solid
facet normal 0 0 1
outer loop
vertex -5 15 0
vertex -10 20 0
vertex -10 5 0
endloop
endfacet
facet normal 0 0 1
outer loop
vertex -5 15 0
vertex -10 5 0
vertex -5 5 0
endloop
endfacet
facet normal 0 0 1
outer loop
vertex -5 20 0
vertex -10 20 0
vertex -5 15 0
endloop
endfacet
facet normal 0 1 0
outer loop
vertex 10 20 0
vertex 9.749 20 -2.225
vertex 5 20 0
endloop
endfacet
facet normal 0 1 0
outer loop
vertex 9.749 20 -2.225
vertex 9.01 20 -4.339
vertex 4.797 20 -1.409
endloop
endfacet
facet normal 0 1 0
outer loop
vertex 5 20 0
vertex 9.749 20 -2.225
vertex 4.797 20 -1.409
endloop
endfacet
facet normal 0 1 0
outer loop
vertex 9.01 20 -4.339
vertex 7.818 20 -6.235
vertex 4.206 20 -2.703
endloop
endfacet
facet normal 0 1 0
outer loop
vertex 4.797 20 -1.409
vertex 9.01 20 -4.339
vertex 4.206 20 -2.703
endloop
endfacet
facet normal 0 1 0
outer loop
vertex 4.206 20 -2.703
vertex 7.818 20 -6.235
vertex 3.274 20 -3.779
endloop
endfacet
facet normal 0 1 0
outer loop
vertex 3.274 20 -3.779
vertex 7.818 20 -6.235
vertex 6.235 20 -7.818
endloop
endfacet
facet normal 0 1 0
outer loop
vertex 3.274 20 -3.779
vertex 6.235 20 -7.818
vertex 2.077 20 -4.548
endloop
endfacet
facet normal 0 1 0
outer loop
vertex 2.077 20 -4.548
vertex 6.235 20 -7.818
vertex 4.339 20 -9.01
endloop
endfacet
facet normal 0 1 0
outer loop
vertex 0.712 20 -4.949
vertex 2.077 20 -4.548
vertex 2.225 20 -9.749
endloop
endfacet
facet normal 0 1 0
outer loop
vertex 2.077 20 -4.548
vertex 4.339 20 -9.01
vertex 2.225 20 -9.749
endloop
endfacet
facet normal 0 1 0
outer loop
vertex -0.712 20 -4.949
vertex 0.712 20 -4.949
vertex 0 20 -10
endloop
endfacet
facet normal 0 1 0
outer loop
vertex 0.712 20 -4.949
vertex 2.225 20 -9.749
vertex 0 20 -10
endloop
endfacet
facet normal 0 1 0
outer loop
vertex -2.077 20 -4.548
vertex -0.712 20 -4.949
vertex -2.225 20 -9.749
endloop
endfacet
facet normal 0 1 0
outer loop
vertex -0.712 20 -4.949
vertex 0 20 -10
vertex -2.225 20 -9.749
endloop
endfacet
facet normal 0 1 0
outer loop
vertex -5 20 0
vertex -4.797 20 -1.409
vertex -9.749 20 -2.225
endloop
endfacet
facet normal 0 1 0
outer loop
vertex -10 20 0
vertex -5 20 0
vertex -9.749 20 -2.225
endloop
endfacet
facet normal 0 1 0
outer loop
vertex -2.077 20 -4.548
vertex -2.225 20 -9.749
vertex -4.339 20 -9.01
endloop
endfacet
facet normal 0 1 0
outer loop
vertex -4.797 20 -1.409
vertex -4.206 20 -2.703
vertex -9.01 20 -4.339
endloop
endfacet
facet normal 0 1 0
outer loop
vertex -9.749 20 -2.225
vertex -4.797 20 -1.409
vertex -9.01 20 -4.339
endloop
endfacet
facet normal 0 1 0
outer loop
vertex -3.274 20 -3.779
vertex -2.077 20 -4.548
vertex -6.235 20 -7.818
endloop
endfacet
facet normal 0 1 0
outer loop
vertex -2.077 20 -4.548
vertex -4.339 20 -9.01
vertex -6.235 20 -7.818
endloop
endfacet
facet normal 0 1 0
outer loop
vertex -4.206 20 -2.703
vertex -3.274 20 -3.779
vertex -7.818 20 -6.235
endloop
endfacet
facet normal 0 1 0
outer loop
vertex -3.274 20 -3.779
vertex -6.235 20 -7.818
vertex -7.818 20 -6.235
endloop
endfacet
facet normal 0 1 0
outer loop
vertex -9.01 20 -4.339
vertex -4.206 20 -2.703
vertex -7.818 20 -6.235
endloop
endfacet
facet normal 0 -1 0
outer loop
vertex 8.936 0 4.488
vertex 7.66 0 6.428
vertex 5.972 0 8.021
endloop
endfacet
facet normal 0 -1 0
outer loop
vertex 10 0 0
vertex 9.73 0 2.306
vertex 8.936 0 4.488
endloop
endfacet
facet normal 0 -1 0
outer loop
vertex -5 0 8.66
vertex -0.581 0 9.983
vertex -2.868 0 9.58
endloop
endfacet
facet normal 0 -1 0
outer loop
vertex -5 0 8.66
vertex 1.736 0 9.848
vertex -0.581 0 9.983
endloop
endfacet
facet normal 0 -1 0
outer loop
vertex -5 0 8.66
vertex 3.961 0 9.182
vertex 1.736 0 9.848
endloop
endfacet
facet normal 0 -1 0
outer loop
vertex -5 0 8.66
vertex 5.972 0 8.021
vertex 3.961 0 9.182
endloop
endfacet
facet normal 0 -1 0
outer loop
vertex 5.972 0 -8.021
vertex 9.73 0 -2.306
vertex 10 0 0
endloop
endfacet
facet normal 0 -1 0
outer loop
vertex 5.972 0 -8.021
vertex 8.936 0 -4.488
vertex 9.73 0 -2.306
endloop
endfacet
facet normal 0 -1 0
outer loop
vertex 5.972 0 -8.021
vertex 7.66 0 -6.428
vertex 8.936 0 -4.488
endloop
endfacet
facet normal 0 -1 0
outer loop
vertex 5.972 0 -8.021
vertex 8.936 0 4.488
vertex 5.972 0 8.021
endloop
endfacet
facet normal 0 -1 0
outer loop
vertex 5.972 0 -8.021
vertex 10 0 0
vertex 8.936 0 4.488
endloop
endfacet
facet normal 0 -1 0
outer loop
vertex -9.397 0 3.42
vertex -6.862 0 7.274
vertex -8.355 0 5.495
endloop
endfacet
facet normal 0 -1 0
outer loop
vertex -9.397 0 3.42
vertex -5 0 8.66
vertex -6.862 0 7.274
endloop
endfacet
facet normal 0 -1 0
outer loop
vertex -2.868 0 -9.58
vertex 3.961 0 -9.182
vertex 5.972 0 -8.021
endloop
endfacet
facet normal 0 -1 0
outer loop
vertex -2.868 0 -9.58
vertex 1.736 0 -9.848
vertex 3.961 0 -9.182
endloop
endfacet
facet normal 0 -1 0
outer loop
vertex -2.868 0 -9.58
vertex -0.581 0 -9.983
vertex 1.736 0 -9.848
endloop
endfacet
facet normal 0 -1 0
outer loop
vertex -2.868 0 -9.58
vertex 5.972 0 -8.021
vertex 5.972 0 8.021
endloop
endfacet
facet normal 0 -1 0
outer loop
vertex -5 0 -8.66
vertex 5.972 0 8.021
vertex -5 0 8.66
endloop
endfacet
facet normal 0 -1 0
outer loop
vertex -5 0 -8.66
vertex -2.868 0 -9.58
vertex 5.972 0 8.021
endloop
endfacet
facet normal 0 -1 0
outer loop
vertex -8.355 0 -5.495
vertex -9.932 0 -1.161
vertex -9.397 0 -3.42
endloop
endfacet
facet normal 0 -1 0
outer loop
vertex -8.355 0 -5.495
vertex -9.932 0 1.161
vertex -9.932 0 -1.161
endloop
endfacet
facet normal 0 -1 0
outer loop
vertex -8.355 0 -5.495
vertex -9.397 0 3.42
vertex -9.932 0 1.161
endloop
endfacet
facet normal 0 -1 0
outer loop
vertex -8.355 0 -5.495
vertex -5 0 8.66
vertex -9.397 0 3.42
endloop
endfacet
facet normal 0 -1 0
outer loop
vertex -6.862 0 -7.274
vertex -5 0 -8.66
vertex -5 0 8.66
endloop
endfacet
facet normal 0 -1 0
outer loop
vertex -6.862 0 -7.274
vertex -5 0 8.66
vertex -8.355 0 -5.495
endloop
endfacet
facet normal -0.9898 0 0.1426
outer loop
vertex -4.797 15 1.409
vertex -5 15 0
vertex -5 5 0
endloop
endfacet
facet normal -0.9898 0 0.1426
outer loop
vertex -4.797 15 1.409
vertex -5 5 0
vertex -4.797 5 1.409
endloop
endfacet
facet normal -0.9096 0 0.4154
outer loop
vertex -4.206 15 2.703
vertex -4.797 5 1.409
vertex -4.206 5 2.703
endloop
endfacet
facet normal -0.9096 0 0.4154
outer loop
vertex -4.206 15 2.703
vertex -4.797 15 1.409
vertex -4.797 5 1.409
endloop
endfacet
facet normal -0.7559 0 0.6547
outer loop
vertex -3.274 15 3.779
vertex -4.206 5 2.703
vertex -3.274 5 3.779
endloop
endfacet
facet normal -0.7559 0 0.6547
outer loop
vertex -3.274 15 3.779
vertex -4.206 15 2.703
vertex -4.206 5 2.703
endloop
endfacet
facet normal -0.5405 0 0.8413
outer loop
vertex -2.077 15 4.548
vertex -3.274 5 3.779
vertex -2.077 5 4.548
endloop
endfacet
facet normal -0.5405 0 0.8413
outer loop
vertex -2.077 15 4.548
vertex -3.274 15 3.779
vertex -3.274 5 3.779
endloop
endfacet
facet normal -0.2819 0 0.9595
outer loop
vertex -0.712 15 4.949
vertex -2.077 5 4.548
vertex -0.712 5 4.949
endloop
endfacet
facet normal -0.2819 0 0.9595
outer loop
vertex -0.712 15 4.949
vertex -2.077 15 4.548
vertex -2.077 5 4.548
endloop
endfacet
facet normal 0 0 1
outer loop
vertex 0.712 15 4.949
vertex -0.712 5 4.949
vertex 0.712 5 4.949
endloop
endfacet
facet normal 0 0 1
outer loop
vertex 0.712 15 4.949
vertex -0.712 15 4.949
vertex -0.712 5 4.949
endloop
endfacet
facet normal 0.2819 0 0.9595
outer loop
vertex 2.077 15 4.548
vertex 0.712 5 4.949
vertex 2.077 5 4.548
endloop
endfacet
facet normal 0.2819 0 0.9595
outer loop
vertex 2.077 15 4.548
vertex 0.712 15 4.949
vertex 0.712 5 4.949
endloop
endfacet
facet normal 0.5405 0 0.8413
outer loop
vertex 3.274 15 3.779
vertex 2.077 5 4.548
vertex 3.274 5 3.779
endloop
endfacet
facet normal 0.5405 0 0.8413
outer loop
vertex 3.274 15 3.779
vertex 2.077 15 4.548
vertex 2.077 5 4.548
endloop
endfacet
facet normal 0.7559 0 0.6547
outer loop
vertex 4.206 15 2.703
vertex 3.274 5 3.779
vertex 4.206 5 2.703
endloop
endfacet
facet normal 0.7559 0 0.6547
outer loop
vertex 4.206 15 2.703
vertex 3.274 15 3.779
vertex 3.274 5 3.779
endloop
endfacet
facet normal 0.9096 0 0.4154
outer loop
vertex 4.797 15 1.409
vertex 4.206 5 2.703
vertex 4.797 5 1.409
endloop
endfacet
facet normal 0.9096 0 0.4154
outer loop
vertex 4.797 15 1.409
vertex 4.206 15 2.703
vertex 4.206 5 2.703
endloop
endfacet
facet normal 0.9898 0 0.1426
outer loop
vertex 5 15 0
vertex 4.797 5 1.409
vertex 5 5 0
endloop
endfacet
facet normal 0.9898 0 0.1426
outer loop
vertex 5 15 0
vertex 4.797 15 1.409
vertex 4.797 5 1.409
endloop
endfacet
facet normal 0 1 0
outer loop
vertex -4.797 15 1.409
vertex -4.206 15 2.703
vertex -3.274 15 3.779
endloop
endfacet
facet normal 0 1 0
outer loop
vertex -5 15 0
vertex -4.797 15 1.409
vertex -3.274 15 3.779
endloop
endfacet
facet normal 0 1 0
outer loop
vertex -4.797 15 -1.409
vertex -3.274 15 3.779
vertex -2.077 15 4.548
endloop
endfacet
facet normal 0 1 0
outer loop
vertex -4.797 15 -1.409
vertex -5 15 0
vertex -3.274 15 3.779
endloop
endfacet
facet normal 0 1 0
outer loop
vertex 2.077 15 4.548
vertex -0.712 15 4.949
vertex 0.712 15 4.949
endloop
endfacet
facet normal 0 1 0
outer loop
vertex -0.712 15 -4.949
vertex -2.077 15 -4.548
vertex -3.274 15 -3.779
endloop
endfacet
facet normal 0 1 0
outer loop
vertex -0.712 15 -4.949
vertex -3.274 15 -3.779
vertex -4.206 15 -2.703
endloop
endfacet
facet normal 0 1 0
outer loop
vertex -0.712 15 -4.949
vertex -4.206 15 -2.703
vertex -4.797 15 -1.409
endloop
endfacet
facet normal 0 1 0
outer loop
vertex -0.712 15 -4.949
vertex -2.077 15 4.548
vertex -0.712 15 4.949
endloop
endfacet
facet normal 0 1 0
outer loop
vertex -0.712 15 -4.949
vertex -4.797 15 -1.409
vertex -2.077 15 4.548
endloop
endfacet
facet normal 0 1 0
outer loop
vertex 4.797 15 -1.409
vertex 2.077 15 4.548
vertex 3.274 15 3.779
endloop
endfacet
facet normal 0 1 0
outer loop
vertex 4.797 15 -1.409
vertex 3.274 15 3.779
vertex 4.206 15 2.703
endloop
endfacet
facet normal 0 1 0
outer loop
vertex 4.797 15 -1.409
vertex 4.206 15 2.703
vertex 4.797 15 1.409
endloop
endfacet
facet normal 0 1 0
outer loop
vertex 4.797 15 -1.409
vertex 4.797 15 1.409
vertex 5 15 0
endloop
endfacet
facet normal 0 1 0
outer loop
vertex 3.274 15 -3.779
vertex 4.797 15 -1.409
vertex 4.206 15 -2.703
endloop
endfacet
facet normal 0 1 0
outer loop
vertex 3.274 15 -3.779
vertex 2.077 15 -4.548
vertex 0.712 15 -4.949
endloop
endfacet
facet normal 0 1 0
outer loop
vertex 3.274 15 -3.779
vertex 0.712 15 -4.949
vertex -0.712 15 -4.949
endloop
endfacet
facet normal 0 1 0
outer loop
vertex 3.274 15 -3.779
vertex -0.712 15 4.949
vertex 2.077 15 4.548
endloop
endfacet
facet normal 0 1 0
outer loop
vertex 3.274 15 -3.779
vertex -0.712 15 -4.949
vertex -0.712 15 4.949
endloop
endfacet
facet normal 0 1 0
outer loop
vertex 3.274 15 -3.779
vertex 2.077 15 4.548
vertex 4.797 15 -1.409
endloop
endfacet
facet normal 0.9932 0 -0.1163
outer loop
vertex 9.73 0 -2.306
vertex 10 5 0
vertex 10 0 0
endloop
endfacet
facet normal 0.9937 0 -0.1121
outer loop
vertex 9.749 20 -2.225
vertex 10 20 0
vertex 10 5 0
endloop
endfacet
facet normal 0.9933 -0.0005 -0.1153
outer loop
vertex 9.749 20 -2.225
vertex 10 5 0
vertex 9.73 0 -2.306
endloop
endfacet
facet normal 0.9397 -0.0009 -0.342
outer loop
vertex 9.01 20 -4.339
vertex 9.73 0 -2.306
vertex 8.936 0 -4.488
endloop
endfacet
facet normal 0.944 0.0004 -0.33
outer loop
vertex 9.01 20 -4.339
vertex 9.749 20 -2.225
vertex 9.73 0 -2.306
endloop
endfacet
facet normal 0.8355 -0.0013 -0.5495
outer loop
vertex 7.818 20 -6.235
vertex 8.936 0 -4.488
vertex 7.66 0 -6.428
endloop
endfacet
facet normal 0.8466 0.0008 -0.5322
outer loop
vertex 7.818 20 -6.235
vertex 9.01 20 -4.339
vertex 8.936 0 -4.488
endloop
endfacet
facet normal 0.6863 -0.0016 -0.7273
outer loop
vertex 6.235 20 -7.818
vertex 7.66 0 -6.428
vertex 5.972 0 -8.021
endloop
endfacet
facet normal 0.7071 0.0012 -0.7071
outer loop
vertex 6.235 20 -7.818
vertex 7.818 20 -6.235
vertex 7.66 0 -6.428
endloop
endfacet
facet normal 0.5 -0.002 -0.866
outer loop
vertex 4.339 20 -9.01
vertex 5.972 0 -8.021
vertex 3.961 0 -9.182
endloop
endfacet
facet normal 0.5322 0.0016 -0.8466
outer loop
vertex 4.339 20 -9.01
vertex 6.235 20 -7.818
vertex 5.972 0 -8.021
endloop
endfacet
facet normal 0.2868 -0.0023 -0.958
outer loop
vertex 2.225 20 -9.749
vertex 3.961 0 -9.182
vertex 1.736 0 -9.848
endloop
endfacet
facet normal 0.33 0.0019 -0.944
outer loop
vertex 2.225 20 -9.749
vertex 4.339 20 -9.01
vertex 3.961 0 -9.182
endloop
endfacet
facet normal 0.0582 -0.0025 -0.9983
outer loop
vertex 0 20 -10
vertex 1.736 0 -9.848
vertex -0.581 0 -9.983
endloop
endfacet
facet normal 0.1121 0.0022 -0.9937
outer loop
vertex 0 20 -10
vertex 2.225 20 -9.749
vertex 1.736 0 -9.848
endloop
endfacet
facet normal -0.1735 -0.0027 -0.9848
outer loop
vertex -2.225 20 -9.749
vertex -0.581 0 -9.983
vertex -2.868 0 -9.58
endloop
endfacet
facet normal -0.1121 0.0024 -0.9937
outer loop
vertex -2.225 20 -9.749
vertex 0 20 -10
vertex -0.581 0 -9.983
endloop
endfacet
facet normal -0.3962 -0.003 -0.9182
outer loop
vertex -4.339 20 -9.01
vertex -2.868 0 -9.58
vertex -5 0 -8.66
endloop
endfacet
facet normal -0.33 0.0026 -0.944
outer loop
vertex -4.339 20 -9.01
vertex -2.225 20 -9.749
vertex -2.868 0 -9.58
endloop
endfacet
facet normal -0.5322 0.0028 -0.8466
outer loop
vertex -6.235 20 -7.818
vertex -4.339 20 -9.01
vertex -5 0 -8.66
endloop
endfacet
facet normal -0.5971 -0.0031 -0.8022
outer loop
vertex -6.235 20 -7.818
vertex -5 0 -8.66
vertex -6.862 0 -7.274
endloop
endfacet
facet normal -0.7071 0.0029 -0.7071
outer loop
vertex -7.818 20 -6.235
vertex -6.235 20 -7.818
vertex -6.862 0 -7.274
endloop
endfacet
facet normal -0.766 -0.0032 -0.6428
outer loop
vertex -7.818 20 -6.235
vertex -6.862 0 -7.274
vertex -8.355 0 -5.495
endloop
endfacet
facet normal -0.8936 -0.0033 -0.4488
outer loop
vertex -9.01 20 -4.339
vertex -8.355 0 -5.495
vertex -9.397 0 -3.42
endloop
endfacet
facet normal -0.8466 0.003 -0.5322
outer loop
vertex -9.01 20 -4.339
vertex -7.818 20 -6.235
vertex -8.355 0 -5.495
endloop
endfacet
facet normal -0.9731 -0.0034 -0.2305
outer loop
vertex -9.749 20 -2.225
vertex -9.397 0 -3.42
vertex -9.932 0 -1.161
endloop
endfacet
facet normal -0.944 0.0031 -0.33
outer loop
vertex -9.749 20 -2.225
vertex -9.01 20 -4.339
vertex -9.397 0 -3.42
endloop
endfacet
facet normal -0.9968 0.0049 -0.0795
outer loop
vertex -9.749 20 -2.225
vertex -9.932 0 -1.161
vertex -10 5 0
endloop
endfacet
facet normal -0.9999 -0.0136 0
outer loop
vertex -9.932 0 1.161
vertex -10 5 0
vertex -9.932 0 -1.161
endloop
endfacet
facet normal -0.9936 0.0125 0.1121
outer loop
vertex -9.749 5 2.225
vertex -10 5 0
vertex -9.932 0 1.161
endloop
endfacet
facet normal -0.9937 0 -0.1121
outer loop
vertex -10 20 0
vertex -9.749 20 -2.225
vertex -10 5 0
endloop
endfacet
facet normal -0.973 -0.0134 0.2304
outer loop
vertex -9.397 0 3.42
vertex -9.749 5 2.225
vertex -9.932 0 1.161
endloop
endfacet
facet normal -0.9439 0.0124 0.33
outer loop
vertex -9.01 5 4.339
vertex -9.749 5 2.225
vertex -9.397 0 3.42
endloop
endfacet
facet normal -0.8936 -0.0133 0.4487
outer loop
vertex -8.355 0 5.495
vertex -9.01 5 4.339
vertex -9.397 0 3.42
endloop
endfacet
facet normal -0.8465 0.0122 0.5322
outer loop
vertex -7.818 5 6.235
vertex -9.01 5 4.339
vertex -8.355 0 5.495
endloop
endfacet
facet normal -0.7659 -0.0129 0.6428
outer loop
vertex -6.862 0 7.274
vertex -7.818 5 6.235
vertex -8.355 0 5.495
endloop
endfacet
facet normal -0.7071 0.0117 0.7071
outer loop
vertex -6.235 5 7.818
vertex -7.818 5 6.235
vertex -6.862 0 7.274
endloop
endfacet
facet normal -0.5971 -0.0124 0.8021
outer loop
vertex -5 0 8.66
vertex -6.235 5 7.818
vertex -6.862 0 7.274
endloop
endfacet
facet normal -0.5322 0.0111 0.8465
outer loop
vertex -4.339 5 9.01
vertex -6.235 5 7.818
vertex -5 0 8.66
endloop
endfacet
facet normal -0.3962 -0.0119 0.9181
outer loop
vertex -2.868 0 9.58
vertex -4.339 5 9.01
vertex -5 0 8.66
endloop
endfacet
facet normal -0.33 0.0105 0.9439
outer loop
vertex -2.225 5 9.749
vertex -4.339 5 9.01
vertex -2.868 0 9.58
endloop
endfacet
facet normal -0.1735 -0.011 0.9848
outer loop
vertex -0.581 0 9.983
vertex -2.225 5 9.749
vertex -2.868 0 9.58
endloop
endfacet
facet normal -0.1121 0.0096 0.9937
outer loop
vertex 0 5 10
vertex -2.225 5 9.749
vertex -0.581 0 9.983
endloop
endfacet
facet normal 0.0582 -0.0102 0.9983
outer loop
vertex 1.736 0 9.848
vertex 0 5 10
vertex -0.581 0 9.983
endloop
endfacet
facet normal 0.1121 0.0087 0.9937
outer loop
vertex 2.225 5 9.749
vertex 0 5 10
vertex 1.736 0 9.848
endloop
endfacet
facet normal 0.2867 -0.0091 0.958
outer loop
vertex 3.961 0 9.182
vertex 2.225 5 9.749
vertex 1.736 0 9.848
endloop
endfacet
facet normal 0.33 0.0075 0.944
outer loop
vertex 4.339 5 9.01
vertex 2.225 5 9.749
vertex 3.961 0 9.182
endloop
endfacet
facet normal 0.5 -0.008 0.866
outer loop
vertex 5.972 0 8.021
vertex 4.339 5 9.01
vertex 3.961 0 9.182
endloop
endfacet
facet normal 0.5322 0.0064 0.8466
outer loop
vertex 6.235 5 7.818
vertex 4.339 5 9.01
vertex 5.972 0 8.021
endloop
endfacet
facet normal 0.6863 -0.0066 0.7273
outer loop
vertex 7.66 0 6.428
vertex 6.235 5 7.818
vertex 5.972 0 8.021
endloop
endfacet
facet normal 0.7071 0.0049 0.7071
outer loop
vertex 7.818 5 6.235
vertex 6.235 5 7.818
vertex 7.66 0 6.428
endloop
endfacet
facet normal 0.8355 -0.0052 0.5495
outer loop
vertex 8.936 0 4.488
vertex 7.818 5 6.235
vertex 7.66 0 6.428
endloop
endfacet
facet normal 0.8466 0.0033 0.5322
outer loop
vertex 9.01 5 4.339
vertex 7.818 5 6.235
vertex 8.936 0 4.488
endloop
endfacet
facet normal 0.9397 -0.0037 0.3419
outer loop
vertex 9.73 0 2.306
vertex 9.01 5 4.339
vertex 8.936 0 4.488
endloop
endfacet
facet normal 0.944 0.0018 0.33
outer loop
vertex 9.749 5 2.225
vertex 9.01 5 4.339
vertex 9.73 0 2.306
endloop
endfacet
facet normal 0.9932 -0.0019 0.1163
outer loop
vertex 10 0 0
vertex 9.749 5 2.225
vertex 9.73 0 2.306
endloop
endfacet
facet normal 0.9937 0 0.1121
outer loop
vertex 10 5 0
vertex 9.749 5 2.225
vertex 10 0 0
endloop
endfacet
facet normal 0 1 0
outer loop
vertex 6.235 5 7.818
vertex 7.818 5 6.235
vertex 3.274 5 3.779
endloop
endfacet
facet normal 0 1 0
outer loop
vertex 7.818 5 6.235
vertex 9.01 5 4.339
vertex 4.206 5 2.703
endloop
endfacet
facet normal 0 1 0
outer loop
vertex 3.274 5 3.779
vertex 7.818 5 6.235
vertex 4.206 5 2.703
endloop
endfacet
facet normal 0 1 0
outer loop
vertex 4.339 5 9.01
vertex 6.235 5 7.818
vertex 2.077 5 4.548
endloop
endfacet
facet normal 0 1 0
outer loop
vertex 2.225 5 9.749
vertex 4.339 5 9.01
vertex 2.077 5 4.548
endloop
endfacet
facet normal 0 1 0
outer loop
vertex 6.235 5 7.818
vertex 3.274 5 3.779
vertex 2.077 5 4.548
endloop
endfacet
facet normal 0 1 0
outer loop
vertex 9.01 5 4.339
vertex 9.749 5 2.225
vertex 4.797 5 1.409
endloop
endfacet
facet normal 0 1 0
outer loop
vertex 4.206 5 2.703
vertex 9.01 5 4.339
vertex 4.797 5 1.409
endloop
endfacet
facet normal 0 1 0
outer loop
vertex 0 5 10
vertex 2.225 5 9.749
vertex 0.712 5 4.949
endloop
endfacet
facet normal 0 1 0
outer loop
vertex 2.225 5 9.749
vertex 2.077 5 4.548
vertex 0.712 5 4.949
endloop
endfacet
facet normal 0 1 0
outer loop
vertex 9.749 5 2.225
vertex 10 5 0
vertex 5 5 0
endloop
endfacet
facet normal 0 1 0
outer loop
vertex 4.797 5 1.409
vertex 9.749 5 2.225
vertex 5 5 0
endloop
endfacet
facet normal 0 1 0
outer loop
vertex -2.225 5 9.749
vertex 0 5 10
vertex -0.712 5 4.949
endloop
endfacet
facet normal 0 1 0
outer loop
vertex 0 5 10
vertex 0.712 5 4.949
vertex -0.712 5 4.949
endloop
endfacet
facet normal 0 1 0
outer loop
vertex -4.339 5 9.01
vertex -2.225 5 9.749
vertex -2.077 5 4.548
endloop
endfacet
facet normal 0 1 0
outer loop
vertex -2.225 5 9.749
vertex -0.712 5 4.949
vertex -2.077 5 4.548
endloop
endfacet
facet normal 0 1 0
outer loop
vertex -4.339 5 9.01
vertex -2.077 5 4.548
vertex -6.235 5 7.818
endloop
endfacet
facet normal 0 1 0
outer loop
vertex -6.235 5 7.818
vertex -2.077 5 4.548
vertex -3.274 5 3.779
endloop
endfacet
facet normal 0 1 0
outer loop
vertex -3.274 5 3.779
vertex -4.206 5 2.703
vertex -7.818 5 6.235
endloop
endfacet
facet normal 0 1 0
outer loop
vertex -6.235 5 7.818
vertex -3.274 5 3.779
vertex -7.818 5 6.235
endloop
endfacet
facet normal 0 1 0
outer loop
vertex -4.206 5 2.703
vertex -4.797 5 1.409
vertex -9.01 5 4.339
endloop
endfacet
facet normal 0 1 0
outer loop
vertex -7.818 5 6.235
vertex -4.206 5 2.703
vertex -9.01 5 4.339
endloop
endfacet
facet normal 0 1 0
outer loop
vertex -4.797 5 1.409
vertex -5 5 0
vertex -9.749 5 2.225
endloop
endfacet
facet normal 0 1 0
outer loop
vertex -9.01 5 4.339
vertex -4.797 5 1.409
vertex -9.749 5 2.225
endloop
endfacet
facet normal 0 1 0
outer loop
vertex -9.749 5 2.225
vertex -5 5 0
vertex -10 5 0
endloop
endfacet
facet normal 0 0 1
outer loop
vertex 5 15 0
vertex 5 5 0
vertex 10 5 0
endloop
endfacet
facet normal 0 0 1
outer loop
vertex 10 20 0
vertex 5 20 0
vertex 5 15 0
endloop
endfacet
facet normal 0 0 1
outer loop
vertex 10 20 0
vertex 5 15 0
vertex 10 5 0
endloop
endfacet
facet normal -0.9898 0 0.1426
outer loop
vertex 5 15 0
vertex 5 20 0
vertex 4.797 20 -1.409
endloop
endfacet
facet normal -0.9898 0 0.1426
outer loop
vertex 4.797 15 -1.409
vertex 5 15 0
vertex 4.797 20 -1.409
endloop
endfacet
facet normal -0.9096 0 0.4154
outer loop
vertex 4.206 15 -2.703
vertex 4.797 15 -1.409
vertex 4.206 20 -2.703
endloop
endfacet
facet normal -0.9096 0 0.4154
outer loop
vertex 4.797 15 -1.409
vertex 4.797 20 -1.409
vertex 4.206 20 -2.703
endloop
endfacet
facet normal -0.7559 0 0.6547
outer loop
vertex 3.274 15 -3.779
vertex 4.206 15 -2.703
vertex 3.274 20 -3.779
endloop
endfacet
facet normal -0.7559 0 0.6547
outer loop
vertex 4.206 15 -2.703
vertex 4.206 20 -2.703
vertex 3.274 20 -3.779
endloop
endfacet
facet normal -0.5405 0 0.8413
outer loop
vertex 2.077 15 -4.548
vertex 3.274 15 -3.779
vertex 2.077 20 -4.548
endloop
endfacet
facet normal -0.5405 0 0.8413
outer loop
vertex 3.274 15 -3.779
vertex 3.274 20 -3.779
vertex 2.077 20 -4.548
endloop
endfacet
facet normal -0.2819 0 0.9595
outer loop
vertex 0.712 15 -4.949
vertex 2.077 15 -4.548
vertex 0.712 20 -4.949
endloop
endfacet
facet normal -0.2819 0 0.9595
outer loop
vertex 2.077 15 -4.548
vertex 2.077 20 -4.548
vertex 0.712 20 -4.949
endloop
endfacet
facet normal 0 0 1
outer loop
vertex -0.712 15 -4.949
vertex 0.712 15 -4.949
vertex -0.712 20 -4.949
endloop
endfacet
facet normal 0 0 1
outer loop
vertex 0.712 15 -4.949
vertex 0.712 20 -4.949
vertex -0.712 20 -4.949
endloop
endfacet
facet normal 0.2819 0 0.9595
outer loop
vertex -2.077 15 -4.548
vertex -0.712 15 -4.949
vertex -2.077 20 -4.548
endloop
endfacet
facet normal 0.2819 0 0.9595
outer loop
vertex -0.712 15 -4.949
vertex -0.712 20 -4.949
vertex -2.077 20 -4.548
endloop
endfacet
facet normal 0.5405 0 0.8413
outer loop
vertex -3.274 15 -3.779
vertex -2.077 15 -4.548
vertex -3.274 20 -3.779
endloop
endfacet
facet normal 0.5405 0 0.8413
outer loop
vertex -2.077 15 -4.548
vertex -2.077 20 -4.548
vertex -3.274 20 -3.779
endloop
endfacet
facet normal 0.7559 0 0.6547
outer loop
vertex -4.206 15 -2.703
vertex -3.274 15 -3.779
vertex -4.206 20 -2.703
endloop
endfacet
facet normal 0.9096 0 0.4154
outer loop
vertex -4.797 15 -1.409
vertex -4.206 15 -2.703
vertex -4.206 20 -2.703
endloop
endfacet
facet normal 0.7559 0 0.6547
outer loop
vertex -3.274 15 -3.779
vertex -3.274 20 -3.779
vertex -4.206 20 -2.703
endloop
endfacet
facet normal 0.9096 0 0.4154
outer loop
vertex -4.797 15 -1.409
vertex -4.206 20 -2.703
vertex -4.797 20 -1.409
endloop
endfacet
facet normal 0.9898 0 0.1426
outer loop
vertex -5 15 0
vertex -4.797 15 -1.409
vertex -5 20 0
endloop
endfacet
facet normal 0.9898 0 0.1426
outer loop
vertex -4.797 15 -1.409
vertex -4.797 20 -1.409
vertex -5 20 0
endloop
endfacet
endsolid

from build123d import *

# Parameters (mm, degrees)
SKETCH1_W          = 10
SKETCH1_H          = 20
SKETCH2_R          = 5
CUT_EXTRUDE5_DEPTH = 5
CUT_EXTRUDE6_DEPTH = 15


with BuildPart() as part:
    # Sketch1 → Revolve1 (revolve)
    with BuildSketch(Plane.XY):
        with Locations((5, 10)):
            Rectangle(SKETCH1_W, SKETCH1_H)
    revolve(axis=Axis((0, 0, 0), (0, 1, 0)))

    # Sketch2 → Cut-Extrude5 (cut)
    with BuildSketch(Plane(origin=(0, 20, 0), x_dir=(1, 0, 0), z_dir=(0, 1, 0))):
        Circle(SKETCH2_R)
    extrude(amount=-CUT_EXTRUDE5_DEPTH, mode=Mode.SUBTRACT)

    # Sketch5 → Cut-Extrude6 (cut)
    with BuildSketch(Plane(origin=(0, 20, 0), x_dir=(1, 0, 0), z_dir=(0, 1, 0))):
        with BuildLine():
            Line((-10, 0), (-5, 0))
            ThreePointArc((-5, 0), (0, -5), (5, 0))
            Line((5, 0), (10, 0))
            ThreePointArc((10, 0), (0, -10), (-10, 0))
        make_face()
    extrude(amount=-CUT_EXTRUDE6_DEPTH, mode=Mode.SUBTRACT)


solid = part.part
